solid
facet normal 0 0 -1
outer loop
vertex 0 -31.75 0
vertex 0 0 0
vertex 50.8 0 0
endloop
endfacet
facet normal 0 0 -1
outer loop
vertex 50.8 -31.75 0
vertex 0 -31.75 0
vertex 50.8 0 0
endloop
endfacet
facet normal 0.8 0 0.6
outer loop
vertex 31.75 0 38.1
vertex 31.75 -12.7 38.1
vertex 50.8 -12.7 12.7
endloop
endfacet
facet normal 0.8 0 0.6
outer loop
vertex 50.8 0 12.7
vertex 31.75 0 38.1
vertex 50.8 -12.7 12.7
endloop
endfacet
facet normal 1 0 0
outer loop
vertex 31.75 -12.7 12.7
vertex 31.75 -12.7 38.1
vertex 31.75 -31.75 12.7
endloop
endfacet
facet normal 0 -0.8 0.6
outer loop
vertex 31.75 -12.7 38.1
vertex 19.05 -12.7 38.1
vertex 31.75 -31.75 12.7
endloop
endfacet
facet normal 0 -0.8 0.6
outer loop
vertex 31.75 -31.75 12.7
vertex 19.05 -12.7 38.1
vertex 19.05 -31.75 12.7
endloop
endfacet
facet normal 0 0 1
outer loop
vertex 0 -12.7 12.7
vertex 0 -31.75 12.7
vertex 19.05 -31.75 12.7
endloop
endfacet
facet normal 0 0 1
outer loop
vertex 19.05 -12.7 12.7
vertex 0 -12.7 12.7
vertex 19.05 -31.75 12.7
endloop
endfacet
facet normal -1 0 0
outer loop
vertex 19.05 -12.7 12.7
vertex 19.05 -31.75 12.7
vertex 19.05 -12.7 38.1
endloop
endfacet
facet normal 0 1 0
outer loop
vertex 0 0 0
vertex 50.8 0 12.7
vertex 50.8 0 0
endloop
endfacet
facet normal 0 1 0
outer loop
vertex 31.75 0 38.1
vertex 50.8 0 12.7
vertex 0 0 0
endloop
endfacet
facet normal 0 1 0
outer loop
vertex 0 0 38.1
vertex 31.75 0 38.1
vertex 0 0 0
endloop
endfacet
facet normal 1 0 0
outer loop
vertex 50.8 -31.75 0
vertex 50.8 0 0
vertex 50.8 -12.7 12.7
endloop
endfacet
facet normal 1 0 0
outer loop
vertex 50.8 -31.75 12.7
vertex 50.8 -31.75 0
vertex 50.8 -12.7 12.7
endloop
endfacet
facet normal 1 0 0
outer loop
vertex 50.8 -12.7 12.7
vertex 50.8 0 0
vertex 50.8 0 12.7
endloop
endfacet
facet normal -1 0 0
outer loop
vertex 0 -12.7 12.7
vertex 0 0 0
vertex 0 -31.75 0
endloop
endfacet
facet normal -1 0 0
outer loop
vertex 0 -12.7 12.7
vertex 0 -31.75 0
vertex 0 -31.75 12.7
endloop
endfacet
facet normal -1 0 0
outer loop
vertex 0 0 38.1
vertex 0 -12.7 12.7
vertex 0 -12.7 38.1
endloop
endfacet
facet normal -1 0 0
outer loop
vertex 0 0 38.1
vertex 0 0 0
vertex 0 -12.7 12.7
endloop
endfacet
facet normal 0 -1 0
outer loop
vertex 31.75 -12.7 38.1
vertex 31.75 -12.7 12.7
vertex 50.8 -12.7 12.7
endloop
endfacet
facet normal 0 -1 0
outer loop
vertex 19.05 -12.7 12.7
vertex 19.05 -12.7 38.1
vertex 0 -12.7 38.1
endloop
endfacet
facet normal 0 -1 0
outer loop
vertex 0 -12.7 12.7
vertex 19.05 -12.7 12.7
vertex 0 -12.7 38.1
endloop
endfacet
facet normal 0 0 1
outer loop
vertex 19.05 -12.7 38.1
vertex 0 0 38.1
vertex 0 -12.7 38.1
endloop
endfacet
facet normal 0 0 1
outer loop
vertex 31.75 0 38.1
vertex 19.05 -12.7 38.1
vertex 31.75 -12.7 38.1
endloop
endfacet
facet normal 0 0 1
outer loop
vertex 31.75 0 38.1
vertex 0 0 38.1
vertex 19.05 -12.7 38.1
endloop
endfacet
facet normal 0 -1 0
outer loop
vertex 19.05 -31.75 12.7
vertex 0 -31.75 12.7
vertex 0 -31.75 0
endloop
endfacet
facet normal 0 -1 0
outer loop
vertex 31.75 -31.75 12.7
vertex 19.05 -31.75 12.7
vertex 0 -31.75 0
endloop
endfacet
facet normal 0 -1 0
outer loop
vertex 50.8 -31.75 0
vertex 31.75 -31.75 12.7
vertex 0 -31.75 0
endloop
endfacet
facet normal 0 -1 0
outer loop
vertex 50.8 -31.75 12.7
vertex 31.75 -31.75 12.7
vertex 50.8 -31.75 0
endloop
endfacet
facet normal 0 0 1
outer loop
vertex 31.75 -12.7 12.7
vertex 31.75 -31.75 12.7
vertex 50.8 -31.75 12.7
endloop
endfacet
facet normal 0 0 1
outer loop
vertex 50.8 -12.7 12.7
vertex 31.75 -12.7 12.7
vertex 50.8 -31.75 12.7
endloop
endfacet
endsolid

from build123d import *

# Parameters (mm, degrees)
F0_W      = 50.8
F0_H      = 38.1
F1_DEPTH  = 31.75
F3_DEPTH  = 31.75
F5_DEPTH  = 31.75
F7_DEPTH  = 19.05
F9_DEPTH  = 19.05
F11_DEPTH = 12.7
F13_DEPTH = 12.7


with BuildPart() as f1:
    # F0 (on Front) → F1 (new body)
    with BuildSketch(Plane.XZ):
        with Locations((25.4, 19.05)):
            Rectangle(F0_W, F0_H)
    extrude(amount=F1_DEPTH)

    # F2 (on face) → F3 (cut)
    with BuildSketch(Plane.XZ.offset(31.75)):
        Polygon((50.8, 38.1), (31.75, 38.1), (50.8, 12.7), align=None)
    extrude(amount=-F3_DEPTH, mode=Mode.SUBTRACT)

    # F4 (on face) → F5 (cut)
    with BuildSketch(Plane.XZ.offset(31.75)):
        Polygon((0, 12.7), (19.05, 38.1), (0, 38.1), align=None)
    extrude(amount=-F5_DEPTH, mode=Mode.SUBTRACT)

    # F6 (on face) → F7 (cut)
    with BuildSketch(Plane.XZ.offset(31.75)):
        Polygon((31.75, 12.7), (50.8, 12.7), (31.75, 38.1), align=None)
    extrude(amount=-F7_DEPTH, mode=Mode.SUBTRACT)

    # F8 (on face) → F9 (cut)
    with BuildSketch(Plane.XZ.offset(31.75)):
        Polygon((19.05, 38.1), (0, 12.7), (19.05, 12.7), align=None)
    extrude(amount=-F9_DEPTH, mode=Mode.SUBTRACT)

    # F10 (on face) → F11 (join)
    with BuildSketch(Plane(origin=(0, 0, 0), x_dir=(-1, 0, 0), z_dir=(0, 1, 0))):
        Polygon((0, 38.1), (-19.05, 38.1), (0, 12.7), align=None)
    extrude(amount=-F11_DEPTH)

    # F12 (on face) → F13 (cut)
    with BuildSketch(Plane(origin=(19.05, 0, 0), x_dir=(0, -1, 0), z_dir=(-1, 0, 0))):
        Polygon((31.75, 38.1), (12.7, 38.1), (31.75, 12.7), align=None)
    extrude(amount=-F13_DEPTH, mode=Mode.SUBTRACT)


solid = f1.part
